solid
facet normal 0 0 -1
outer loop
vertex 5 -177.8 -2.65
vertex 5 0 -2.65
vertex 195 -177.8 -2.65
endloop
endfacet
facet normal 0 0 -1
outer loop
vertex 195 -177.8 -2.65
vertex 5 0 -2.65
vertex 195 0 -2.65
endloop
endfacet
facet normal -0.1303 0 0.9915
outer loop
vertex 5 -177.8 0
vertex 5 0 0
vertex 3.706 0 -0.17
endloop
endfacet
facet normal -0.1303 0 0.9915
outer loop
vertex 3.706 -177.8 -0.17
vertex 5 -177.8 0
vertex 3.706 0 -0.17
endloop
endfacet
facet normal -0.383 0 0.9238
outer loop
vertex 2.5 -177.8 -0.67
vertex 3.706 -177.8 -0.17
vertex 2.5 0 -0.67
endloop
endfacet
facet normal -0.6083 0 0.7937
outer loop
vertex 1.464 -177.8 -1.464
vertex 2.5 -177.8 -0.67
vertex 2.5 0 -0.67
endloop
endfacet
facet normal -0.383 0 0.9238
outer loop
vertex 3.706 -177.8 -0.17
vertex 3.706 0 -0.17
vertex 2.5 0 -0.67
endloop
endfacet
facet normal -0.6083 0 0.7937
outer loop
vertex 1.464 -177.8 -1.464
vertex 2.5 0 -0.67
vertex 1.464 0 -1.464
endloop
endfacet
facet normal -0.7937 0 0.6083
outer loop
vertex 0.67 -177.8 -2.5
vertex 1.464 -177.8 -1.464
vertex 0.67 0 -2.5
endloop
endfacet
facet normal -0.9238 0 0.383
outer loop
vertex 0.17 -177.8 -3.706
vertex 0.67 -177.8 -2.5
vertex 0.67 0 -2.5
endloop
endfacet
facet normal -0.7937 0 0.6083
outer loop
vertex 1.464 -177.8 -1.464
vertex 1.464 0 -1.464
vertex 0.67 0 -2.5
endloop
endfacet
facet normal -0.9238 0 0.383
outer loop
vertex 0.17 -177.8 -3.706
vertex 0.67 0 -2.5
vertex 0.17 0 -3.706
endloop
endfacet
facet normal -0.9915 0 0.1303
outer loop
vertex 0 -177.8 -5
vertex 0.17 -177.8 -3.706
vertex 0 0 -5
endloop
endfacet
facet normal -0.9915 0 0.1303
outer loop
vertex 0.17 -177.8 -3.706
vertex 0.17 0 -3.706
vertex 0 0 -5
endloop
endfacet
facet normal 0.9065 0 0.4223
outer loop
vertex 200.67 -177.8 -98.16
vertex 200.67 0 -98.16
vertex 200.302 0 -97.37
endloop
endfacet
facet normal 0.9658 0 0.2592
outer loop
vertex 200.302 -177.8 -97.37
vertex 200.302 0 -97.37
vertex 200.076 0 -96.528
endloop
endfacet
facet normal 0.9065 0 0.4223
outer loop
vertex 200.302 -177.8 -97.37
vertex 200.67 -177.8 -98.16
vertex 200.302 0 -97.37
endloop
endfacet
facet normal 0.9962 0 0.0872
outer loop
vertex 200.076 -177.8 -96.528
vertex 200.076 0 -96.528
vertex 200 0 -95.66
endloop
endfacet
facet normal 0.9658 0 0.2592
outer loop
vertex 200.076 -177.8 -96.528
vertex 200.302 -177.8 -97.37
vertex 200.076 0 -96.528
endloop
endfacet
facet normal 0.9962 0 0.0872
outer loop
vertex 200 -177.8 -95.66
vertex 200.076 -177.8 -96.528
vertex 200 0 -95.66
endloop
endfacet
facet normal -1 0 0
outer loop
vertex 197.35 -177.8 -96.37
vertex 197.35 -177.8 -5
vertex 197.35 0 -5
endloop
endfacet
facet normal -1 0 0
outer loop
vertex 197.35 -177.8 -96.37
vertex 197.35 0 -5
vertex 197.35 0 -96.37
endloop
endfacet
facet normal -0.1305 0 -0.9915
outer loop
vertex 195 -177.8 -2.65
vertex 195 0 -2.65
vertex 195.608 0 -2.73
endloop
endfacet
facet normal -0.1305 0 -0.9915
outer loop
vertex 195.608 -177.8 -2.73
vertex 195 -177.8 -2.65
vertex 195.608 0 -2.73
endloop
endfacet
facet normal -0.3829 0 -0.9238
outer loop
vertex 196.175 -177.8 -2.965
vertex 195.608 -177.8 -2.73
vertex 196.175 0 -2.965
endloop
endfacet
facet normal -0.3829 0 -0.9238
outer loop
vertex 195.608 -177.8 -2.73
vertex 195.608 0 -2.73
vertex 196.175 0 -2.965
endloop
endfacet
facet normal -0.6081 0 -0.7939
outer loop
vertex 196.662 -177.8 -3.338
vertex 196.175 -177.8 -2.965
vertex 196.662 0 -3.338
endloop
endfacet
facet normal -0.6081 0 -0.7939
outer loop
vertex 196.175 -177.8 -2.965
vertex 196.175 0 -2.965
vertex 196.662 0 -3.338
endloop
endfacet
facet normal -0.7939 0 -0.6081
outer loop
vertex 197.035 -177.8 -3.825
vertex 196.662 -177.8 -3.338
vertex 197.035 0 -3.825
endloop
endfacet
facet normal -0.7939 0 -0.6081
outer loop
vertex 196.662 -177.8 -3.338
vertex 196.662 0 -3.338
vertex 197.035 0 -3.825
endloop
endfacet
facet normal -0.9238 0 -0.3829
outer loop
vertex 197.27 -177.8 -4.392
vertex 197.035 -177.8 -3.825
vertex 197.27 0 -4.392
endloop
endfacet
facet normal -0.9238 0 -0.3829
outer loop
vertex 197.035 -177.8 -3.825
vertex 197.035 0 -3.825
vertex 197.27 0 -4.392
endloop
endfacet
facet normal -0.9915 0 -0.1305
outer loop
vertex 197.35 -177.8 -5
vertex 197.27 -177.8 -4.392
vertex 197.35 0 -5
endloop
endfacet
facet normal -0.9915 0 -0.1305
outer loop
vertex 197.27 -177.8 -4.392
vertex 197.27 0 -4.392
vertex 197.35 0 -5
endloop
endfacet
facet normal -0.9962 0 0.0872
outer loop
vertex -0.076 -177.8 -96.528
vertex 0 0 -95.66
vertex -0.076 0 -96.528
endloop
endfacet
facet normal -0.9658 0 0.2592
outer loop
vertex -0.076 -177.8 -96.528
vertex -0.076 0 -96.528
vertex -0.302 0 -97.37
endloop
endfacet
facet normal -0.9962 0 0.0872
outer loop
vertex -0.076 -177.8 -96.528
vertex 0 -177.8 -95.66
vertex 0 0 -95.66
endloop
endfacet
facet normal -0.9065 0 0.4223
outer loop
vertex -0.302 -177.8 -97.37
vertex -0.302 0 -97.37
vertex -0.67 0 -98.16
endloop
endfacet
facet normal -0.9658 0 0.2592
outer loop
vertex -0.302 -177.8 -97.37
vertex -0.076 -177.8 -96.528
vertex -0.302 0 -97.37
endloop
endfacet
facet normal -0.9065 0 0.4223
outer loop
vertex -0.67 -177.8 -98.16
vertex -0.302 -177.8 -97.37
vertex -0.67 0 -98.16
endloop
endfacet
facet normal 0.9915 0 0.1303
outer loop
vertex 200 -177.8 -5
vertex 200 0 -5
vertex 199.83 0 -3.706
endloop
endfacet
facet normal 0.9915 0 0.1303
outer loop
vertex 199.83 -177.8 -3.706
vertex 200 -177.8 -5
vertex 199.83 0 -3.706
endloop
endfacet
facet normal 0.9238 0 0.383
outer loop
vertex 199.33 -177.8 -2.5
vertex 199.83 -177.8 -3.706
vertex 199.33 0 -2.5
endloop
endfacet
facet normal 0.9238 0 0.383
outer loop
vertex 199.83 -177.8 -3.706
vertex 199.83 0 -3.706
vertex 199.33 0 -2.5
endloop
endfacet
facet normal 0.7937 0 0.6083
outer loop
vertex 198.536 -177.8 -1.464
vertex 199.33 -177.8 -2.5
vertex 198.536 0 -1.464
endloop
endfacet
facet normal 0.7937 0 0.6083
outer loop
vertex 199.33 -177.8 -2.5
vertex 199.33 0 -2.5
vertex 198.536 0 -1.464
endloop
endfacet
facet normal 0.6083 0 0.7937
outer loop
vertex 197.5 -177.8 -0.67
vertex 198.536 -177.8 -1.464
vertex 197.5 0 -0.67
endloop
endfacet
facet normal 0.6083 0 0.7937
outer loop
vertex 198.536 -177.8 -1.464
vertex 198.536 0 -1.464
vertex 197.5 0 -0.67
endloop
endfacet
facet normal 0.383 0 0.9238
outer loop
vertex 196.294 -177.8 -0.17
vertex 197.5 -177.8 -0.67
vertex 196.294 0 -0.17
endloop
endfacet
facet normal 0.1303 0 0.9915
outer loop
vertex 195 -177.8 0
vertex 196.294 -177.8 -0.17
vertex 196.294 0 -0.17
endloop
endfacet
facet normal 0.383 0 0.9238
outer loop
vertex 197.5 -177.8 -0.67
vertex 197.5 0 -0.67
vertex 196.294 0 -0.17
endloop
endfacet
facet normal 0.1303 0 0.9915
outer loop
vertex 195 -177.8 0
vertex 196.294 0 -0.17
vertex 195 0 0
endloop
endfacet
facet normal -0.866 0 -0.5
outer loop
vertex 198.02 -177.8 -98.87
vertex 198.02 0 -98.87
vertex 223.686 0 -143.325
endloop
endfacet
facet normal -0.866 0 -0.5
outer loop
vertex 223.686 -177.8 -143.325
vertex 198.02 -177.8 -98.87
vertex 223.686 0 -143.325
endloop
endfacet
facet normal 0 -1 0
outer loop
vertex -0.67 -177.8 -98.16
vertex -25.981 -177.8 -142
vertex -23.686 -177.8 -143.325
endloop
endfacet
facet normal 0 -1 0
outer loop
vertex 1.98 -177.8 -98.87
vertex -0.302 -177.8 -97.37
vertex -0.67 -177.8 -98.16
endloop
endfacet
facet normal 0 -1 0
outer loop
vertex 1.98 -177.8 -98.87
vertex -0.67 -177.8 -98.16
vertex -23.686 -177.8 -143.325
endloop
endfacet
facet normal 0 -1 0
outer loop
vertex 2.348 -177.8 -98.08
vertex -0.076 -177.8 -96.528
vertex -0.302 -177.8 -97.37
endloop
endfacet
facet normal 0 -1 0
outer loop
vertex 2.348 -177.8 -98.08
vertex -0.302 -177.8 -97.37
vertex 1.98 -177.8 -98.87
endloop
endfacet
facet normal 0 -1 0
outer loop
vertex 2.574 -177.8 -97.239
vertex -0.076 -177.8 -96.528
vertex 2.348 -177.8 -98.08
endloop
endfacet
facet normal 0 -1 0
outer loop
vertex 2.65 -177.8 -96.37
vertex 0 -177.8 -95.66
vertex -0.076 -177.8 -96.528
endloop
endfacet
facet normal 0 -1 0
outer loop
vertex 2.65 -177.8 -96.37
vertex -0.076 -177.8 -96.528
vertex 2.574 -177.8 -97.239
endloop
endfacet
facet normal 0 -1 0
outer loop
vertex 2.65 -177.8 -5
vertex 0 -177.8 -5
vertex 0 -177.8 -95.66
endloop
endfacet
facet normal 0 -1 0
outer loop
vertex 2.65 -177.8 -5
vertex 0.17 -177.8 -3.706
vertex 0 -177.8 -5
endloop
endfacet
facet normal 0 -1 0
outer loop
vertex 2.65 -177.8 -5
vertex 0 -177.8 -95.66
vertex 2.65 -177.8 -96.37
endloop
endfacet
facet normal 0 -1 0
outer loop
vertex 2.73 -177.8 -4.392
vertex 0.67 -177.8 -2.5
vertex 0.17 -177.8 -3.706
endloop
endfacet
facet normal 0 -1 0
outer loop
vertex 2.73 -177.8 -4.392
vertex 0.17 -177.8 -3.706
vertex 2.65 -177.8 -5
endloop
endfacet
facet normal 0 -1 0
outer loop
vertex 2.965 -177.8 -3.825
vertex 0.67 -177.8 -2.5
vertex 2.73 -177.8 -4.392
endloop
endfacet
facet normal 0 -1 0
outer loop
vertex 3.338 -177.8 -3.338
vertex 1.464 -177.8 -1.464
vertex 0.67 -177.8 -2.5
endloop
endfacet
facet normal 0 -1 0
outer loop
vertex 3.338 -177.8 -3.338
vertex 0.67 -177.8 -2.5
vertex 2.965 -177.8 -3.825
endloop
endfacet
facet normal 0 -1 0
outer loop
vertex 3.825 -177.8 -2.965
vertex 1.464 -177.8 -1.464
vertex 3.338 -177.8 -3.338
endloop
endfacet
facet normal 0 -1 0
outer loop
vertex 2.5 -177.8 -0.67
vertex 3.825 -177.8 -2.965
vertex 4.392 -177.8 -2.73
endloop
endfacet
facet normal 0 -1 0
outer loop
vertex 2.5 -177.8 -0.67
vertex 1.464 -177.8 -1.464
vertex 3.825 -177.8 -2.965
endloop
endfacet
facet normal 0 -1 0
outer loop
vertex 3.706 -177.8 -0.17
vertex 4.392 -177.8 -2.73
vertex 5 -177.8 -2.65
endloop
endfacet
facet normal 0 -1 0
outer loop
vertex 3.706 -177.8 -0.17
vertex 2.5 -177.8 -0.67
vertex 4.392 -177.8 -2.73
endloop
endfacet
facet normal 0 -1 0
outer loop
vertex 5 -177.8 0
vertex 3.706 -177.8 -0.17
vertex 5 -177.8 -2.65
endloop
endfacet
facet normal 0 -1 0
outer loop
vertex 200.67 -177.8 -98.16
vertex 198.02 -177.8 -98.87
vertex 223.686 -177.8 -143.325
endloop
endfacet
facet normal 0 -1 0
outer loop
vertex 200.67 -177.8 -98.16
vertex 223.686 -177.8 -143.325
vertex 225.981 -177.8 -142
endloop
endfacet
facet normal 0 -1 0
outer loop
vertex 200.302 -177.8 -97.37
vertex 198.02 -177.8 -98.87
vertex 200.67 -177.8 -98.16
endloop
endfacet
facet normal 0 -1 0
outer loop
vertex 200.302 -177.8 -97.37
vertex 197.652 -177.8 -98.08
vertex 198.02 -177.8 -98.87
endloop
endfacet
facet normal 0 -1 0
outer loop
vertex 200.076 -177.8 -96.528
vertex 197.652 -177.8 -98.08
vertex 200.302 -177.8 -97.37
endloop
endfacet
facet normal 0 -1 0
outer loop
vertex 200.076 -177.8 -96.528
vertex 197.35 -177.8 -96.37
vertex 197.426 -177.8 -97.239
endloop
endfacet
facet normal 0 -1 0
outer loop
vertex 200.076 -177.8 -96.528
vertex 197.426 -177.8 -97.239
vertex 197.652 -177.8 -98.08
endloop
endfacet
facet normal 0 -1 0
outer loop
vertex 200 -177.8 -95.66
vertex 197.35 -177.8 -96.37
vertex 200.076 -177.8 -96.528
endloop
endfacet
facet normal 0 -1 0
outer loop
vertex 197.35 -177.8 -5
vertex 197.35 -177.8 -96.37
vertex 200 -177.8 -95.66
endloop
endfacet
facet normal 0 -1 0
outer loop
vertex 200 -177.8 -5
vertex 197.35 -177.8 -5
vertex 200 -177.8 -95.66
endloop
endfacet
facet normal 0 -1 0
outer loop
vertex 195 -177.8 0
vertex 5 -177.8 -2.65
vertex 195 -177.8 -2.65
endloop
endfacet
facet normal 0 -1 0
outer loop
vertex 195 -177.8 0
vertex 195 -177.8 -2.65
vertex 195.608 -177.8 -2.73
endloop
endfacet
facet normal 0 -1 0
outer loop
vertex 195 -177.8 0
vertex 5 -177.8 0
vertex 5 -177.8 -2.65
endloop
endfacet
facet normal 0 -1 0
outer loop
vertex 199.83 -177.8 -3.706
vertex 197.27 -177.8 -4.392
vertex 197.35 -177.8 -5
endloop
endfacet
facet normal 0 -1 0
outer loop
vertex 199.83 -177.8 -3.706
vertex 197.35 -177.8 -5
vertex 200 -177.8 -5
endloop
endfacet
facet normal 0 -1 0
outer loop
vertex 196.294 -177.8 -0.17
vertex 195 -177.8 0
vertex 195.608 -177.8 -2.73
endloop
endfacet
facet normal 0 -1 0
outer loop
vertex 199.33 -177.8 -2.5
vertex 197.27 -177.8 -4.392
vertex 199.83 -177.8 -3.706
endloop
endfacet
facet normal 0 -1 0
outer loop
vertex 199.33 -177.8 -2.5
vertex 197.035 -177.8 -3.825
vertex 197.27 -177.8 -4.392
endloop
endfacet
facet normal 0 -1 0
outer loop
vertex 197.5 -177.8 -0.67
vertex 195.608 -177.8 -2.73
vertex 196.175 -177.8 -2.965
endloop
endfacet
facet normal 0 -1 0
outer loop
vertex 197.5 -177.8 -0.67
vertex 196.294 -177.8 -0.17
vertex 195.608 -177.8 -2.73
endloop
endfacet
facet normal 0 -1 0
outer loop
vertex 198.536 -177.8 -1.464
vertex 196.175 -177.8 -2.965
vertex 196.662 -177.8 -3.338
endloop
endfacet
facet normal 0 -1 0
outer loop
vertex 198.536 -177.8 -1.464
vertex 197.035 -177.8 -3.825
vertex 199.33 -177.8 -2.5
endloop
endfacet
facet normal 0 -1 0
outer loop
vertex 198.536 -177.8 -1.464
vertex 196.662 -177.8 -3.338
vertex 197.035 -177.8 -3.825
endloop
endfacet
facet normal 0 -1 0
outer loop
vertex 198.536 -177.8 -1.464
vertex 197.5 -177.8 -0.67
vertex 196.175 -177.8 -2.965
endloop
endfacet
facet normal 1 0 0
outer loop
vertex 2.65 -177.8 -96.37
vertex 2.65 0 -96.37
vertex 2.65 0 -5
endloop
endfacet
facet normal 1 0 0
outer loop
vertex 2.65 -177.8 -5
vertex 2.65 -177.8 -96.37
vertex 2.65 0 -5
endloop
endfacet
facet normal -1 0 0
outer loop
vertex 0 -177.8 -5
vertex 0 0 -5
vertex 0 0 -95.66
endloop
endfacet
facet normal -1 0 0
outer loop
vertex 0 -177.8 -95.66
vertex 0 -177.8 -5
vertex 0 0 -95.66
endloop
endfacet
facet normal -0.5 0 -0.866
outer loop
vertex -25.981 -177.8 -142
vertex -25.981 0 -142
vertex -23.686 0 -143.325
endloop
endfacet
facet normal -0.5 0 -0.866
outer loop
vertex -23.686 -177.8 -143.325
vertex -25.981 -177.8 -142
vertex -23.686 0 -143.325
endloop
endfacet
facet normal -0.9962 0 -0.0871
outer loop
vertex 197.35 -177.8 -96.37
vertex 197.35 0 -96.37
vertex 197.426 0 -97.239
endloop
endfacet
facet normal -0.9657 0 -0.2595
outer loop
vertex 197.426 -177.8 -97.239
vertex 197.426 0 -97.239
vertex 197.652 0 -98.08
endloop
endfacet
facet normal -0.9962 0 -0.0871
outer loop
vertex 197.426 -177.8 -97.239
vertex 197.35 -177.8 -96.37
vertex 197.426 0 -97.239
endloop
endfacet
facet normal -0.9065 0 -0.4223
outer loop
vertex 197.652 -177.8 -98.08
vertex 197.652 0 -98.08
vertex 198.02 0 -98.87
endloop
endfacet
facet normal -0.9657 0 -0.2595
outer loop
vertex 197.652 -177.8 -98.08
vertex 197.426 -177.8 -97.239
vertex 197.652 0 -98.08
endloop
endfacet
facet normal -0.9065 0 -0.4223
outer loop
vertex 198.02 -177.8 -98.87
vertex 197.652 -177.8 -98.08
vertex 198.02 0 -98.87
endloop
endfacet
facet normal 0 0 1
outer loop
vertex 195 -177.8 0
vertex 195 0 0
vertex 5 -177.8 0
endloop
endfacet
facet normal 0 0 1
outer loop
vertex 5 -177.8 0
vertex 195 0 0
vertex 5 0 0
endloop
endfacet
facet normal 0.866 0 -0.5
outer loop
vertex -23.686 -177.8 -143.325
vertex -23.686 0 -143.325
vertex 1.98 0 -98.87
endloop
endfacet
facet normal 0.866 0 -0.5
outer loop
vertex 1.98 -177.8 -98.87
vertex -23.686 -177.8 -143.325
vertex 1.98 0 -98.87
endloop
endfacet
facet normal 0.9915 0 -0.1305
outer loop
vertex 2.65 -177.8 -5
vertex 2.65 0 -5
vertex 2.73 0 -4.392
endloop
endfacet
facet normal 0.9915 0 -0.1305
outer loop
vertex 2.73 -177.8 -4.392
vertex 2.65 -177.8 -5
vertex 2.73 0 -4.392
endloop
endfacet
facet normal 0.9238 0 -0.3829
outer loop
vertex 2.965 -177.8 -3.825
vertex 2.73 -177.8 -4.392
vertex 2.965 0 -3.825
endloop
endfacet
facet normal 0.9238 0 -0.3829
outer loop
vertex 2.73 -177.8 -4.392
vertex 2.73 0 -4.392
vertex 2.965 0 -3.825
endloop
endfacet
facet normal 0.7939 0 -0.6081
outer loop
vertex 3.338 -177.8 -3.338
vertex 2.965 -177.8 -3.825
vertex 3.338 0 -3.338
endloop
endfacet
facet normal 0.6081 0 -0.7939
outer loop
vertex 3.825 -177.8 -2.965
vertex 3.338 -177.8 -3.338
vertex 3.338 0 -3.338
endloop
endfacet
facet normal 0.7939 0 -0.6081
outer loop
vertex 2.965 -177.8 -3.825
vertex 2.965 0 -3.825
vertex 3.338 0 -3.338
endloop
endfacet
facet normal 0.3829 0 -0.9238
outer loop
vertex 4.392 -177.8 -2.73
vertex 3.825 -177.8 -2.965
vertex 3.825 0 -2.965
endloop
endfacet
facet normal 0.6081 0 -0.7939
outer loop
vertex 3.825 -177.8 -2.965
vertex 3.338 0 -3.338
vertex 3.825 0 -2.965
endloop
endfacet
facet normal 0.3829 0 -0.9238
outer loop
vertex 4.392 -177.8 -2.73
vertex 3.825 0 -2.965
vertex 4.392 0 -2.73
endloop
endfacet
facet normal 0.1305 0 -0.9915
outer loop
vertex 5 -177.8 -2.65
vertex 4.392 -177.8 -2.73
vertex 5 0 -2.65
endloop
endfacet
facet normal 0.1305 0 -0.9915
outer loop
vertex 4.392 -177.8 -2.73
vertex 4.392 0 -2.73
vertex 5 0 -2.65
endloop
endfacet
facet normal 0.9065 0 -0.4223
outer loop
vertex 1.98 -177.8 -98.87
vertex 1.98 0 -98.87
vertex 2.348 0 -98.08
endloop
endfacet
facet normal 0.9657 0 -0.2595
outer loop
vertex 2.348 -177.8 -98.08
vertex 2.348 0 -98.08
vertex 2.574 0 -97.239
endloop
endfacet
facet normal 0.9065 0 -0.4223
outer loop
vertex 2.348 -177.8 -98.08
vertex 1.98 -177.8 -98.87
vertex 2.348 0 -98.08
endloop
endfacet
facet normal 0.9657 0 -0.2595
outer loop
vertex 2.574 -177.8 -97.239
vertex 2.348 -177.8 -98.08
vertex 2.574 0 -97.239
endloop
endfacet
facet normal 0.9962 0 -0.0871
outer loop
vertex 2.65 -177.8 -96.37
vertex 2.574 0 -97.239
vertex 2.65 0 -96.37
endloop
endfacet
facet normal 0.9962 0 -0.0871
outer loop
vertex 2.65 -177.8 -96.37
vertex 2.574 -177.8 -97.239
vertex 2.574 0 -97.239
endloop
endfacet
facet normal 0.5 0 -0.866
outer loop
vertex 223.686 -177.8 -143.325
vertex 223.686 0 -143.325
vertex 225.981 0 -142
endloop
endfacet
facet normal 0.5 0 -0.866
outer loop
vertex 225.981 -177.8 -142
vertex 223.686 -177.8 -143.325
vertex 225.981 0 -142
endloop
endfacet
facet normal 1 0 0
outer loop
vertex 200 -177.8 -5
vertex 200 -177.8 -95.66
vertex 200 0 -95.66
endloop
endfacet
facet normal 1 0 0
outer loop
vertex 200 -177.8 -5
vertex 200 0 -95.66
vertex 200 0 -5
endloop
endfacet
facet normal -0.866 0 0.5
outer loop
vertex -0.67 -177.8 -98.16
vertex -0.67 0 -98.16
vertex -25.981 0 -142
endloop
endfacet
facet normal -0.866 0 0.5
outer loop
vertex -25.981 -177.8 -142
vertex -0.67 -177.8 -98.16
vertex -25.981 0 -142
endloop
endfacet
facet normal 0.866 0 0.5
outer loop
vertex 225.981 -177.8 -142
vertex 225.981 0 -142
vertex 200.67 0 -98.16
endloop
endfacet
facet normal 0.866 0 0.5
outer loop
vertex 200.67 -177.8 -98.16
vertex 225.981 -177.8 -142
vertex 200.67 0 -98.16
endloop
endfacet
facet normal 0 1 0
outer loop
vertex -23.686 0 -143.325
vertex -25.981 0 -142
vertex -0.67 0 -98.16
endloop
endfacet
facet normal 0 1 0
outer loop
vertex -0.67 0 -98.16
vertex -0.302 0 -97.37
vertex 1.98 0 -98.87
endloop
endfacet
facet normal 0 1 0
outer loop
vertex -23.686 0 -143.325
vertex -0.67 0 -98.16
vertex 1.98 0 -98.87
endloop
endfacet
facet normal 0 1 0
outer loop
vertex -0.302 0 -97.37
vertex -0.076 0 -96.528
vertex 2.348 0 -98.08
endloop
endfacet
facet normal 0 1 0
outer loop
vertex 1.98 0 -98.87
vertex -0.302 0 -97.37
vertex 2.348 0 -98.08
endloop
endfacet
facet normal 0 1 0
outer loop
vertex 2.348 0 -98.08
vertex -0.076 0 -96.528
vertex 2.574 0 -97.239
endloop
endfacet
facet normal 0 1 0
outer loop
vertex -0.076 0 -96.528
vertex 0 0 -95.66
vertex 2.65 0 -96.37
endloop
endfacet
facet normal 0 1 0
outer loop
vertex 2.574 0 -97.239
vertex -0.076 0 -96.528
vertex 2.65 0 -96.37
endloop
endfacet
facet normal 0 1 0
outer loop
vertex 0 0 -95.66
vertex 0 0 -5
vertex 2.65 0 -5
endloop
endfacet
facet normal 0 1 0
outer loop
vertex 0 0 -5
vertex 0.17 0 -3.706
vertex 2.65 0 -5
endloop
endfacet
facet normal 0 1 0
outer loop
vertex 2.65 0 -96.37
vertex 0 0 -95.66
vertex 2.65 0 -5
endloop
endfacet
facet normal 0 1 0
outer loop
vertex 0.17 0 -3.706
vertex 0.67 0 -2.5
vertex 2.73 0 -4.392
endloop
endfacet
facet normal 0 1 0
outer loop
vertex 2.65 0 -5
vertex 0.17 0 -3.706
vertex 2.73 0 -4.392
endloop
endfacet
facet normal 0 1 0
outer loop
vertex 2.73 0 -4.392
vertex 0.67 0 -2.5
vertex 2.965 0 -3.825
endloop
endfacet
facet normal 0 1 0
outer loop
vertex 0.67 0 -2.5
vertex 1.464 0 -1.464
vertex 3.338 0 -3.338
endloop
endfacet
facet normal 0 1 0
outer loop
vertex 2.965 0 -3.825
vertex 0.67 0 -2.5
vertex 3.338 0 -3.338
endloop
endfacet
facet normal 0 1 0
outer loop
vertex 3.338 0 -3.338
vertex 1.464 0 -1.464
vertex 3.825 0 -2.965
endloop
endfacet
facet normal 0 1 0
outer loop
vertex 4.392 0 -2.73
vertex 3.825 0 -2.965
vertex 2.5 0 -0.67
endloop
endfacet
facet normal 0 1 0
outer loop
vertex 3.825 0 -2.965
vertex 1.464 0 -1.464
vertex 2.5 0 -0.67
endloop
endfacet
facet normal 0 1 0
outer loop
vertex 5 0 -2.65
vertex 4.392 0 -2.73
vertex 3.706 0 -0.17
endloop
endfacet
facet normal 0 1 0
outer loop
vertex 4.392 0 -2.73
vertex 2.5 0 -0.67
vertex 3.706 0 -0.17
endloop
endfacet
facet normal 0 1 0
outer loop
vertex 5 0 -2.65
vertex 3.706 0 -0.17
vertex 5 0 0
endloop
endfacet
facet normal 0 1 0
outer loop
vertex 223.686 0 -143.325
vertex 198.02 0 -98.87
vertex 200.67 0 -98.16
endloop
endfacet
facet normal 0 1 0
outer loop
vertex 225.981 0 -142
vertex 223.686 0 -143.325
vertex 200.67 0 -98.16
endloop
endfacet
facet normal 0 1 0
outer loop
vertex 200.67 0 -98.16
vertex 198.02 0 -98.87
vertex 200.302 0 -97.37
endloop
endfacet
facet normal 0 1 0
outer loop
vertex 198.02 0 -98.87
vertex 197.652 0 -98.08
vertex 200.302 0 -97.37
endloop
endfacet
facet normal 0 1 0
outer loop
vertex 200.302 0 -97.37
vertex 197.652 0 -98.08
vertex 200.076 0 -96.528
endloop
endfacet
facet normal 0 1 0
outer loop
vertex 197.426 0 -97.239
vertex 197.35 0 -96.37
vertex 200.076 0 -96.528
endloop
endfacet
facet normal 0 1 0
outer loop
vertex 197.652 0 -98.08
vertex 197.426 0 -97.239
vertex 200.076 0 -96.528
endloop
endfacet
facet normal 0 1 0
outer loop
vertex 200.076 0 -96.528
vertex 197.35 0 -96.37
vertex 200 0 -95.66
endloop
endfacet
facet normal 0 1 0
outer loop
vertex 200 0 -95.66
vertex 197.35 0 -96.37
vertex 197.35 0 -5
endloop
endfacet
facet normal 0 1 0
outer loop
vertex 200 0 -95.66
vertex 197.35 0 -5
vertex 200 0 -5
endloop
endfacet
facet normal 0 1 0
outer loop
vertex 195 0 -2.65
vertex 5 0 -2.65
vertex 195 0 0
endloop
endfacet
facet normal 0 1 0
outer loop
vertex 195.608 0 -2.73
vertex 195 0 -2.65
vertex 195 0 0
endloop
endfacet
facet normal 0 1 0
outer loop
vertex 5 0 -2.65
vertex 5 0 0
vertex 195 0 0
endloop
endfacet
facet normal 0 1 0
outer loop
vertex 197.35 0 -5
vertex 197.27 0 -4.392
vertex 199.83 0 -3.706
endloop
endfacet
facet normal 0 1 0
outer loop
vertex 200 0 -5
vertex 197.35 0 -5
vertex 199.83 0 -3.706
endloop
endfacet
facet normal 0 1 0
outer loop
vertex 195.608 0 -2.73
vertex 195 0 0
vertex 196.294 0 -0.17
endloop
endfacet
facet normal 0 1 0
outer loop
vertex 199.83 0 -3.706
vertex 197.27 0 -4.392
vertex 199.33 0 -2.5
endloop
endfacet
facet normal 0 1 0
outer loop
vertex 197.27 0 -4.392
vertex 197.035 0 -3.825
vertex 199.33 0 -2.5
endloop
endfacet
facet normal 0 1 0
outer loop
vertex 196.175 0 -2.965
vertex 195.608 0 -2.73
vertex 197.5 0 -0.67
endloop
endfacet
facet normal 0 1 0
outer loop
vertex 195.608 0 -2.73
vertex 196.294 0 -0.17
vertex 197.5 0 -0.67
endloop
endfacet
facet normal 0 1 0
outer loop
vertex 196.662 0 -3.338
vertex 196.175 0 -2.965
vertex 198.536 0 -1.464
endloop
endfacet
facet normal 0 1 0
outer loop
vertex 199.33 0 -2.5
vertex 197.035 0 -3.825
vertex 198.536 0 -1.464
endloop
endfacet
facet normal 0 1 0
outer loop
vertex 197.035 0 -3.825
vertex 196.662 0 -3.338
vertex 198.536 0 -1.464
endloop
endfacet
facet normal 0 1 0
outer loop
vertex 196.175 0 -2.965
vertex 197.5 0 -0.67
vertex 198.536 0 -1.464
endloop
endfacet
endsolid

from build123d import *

# Parameters (mm, degrees)
F1_DEPTH = 177.8
F2_R     = 5


with BuildPart() as f1:
    # F0 (on Front) → F1 (new body)
    with BuildSketch(Plane.XZ):
        with BuildLine():
            Line((195, 0), (5, 0))
            ThreePointArc((5, 0), (1.4644660941, -1.4644660941), (0, -5))
            Line((0, -5), (0, -97))
            Line((0, -97), (-25.9807621135, -142))
            Line((-25.9807621135, -142), (-23.6857947935, -143.325))
            Line((-23.6857947935, -143.325), (2.65, -97.7100653599))
            Line((2.65, -97.7100653599), (2.65, -5))
            ThreePointArc((2.65, -5), (3.3382990642, -3.3382990642), (5, -2.65))
            Line((5, -2.65), (195, -2.65))
            ThreePointArc((195, -2.65), (196.6617009358, -3.3382990642), (197.35, -5))
            Line((197.35, -5), (197.35, -97.7100653599))
            Line((197.35, -97.7100653599), (223.6857947935, -143.325))
            Line((223.6857947935, -143.325), (225.9807621135, -142))
            Line((225.9807621135, -142), (200, -97))
            Line((200, -97), (200, -5))
            ThreePointArc((200, -5), (198.5355339059, -1.4644660941), (195, 0))
        make_face()
    extrude(amount=F1_DEPTH)

    # F2
    f2_edges = [f1.edges().sort_by_distance(p)[0] for p in [
        (200, -88.9, -97),
        (197.35, -88.9, -97.710065),
        (2.65, -88.9, -97.710065),
        (0, -88.9, -97),
    ]]
    fillet(f2_edges, radius=F2_R)


solid = f1.part
